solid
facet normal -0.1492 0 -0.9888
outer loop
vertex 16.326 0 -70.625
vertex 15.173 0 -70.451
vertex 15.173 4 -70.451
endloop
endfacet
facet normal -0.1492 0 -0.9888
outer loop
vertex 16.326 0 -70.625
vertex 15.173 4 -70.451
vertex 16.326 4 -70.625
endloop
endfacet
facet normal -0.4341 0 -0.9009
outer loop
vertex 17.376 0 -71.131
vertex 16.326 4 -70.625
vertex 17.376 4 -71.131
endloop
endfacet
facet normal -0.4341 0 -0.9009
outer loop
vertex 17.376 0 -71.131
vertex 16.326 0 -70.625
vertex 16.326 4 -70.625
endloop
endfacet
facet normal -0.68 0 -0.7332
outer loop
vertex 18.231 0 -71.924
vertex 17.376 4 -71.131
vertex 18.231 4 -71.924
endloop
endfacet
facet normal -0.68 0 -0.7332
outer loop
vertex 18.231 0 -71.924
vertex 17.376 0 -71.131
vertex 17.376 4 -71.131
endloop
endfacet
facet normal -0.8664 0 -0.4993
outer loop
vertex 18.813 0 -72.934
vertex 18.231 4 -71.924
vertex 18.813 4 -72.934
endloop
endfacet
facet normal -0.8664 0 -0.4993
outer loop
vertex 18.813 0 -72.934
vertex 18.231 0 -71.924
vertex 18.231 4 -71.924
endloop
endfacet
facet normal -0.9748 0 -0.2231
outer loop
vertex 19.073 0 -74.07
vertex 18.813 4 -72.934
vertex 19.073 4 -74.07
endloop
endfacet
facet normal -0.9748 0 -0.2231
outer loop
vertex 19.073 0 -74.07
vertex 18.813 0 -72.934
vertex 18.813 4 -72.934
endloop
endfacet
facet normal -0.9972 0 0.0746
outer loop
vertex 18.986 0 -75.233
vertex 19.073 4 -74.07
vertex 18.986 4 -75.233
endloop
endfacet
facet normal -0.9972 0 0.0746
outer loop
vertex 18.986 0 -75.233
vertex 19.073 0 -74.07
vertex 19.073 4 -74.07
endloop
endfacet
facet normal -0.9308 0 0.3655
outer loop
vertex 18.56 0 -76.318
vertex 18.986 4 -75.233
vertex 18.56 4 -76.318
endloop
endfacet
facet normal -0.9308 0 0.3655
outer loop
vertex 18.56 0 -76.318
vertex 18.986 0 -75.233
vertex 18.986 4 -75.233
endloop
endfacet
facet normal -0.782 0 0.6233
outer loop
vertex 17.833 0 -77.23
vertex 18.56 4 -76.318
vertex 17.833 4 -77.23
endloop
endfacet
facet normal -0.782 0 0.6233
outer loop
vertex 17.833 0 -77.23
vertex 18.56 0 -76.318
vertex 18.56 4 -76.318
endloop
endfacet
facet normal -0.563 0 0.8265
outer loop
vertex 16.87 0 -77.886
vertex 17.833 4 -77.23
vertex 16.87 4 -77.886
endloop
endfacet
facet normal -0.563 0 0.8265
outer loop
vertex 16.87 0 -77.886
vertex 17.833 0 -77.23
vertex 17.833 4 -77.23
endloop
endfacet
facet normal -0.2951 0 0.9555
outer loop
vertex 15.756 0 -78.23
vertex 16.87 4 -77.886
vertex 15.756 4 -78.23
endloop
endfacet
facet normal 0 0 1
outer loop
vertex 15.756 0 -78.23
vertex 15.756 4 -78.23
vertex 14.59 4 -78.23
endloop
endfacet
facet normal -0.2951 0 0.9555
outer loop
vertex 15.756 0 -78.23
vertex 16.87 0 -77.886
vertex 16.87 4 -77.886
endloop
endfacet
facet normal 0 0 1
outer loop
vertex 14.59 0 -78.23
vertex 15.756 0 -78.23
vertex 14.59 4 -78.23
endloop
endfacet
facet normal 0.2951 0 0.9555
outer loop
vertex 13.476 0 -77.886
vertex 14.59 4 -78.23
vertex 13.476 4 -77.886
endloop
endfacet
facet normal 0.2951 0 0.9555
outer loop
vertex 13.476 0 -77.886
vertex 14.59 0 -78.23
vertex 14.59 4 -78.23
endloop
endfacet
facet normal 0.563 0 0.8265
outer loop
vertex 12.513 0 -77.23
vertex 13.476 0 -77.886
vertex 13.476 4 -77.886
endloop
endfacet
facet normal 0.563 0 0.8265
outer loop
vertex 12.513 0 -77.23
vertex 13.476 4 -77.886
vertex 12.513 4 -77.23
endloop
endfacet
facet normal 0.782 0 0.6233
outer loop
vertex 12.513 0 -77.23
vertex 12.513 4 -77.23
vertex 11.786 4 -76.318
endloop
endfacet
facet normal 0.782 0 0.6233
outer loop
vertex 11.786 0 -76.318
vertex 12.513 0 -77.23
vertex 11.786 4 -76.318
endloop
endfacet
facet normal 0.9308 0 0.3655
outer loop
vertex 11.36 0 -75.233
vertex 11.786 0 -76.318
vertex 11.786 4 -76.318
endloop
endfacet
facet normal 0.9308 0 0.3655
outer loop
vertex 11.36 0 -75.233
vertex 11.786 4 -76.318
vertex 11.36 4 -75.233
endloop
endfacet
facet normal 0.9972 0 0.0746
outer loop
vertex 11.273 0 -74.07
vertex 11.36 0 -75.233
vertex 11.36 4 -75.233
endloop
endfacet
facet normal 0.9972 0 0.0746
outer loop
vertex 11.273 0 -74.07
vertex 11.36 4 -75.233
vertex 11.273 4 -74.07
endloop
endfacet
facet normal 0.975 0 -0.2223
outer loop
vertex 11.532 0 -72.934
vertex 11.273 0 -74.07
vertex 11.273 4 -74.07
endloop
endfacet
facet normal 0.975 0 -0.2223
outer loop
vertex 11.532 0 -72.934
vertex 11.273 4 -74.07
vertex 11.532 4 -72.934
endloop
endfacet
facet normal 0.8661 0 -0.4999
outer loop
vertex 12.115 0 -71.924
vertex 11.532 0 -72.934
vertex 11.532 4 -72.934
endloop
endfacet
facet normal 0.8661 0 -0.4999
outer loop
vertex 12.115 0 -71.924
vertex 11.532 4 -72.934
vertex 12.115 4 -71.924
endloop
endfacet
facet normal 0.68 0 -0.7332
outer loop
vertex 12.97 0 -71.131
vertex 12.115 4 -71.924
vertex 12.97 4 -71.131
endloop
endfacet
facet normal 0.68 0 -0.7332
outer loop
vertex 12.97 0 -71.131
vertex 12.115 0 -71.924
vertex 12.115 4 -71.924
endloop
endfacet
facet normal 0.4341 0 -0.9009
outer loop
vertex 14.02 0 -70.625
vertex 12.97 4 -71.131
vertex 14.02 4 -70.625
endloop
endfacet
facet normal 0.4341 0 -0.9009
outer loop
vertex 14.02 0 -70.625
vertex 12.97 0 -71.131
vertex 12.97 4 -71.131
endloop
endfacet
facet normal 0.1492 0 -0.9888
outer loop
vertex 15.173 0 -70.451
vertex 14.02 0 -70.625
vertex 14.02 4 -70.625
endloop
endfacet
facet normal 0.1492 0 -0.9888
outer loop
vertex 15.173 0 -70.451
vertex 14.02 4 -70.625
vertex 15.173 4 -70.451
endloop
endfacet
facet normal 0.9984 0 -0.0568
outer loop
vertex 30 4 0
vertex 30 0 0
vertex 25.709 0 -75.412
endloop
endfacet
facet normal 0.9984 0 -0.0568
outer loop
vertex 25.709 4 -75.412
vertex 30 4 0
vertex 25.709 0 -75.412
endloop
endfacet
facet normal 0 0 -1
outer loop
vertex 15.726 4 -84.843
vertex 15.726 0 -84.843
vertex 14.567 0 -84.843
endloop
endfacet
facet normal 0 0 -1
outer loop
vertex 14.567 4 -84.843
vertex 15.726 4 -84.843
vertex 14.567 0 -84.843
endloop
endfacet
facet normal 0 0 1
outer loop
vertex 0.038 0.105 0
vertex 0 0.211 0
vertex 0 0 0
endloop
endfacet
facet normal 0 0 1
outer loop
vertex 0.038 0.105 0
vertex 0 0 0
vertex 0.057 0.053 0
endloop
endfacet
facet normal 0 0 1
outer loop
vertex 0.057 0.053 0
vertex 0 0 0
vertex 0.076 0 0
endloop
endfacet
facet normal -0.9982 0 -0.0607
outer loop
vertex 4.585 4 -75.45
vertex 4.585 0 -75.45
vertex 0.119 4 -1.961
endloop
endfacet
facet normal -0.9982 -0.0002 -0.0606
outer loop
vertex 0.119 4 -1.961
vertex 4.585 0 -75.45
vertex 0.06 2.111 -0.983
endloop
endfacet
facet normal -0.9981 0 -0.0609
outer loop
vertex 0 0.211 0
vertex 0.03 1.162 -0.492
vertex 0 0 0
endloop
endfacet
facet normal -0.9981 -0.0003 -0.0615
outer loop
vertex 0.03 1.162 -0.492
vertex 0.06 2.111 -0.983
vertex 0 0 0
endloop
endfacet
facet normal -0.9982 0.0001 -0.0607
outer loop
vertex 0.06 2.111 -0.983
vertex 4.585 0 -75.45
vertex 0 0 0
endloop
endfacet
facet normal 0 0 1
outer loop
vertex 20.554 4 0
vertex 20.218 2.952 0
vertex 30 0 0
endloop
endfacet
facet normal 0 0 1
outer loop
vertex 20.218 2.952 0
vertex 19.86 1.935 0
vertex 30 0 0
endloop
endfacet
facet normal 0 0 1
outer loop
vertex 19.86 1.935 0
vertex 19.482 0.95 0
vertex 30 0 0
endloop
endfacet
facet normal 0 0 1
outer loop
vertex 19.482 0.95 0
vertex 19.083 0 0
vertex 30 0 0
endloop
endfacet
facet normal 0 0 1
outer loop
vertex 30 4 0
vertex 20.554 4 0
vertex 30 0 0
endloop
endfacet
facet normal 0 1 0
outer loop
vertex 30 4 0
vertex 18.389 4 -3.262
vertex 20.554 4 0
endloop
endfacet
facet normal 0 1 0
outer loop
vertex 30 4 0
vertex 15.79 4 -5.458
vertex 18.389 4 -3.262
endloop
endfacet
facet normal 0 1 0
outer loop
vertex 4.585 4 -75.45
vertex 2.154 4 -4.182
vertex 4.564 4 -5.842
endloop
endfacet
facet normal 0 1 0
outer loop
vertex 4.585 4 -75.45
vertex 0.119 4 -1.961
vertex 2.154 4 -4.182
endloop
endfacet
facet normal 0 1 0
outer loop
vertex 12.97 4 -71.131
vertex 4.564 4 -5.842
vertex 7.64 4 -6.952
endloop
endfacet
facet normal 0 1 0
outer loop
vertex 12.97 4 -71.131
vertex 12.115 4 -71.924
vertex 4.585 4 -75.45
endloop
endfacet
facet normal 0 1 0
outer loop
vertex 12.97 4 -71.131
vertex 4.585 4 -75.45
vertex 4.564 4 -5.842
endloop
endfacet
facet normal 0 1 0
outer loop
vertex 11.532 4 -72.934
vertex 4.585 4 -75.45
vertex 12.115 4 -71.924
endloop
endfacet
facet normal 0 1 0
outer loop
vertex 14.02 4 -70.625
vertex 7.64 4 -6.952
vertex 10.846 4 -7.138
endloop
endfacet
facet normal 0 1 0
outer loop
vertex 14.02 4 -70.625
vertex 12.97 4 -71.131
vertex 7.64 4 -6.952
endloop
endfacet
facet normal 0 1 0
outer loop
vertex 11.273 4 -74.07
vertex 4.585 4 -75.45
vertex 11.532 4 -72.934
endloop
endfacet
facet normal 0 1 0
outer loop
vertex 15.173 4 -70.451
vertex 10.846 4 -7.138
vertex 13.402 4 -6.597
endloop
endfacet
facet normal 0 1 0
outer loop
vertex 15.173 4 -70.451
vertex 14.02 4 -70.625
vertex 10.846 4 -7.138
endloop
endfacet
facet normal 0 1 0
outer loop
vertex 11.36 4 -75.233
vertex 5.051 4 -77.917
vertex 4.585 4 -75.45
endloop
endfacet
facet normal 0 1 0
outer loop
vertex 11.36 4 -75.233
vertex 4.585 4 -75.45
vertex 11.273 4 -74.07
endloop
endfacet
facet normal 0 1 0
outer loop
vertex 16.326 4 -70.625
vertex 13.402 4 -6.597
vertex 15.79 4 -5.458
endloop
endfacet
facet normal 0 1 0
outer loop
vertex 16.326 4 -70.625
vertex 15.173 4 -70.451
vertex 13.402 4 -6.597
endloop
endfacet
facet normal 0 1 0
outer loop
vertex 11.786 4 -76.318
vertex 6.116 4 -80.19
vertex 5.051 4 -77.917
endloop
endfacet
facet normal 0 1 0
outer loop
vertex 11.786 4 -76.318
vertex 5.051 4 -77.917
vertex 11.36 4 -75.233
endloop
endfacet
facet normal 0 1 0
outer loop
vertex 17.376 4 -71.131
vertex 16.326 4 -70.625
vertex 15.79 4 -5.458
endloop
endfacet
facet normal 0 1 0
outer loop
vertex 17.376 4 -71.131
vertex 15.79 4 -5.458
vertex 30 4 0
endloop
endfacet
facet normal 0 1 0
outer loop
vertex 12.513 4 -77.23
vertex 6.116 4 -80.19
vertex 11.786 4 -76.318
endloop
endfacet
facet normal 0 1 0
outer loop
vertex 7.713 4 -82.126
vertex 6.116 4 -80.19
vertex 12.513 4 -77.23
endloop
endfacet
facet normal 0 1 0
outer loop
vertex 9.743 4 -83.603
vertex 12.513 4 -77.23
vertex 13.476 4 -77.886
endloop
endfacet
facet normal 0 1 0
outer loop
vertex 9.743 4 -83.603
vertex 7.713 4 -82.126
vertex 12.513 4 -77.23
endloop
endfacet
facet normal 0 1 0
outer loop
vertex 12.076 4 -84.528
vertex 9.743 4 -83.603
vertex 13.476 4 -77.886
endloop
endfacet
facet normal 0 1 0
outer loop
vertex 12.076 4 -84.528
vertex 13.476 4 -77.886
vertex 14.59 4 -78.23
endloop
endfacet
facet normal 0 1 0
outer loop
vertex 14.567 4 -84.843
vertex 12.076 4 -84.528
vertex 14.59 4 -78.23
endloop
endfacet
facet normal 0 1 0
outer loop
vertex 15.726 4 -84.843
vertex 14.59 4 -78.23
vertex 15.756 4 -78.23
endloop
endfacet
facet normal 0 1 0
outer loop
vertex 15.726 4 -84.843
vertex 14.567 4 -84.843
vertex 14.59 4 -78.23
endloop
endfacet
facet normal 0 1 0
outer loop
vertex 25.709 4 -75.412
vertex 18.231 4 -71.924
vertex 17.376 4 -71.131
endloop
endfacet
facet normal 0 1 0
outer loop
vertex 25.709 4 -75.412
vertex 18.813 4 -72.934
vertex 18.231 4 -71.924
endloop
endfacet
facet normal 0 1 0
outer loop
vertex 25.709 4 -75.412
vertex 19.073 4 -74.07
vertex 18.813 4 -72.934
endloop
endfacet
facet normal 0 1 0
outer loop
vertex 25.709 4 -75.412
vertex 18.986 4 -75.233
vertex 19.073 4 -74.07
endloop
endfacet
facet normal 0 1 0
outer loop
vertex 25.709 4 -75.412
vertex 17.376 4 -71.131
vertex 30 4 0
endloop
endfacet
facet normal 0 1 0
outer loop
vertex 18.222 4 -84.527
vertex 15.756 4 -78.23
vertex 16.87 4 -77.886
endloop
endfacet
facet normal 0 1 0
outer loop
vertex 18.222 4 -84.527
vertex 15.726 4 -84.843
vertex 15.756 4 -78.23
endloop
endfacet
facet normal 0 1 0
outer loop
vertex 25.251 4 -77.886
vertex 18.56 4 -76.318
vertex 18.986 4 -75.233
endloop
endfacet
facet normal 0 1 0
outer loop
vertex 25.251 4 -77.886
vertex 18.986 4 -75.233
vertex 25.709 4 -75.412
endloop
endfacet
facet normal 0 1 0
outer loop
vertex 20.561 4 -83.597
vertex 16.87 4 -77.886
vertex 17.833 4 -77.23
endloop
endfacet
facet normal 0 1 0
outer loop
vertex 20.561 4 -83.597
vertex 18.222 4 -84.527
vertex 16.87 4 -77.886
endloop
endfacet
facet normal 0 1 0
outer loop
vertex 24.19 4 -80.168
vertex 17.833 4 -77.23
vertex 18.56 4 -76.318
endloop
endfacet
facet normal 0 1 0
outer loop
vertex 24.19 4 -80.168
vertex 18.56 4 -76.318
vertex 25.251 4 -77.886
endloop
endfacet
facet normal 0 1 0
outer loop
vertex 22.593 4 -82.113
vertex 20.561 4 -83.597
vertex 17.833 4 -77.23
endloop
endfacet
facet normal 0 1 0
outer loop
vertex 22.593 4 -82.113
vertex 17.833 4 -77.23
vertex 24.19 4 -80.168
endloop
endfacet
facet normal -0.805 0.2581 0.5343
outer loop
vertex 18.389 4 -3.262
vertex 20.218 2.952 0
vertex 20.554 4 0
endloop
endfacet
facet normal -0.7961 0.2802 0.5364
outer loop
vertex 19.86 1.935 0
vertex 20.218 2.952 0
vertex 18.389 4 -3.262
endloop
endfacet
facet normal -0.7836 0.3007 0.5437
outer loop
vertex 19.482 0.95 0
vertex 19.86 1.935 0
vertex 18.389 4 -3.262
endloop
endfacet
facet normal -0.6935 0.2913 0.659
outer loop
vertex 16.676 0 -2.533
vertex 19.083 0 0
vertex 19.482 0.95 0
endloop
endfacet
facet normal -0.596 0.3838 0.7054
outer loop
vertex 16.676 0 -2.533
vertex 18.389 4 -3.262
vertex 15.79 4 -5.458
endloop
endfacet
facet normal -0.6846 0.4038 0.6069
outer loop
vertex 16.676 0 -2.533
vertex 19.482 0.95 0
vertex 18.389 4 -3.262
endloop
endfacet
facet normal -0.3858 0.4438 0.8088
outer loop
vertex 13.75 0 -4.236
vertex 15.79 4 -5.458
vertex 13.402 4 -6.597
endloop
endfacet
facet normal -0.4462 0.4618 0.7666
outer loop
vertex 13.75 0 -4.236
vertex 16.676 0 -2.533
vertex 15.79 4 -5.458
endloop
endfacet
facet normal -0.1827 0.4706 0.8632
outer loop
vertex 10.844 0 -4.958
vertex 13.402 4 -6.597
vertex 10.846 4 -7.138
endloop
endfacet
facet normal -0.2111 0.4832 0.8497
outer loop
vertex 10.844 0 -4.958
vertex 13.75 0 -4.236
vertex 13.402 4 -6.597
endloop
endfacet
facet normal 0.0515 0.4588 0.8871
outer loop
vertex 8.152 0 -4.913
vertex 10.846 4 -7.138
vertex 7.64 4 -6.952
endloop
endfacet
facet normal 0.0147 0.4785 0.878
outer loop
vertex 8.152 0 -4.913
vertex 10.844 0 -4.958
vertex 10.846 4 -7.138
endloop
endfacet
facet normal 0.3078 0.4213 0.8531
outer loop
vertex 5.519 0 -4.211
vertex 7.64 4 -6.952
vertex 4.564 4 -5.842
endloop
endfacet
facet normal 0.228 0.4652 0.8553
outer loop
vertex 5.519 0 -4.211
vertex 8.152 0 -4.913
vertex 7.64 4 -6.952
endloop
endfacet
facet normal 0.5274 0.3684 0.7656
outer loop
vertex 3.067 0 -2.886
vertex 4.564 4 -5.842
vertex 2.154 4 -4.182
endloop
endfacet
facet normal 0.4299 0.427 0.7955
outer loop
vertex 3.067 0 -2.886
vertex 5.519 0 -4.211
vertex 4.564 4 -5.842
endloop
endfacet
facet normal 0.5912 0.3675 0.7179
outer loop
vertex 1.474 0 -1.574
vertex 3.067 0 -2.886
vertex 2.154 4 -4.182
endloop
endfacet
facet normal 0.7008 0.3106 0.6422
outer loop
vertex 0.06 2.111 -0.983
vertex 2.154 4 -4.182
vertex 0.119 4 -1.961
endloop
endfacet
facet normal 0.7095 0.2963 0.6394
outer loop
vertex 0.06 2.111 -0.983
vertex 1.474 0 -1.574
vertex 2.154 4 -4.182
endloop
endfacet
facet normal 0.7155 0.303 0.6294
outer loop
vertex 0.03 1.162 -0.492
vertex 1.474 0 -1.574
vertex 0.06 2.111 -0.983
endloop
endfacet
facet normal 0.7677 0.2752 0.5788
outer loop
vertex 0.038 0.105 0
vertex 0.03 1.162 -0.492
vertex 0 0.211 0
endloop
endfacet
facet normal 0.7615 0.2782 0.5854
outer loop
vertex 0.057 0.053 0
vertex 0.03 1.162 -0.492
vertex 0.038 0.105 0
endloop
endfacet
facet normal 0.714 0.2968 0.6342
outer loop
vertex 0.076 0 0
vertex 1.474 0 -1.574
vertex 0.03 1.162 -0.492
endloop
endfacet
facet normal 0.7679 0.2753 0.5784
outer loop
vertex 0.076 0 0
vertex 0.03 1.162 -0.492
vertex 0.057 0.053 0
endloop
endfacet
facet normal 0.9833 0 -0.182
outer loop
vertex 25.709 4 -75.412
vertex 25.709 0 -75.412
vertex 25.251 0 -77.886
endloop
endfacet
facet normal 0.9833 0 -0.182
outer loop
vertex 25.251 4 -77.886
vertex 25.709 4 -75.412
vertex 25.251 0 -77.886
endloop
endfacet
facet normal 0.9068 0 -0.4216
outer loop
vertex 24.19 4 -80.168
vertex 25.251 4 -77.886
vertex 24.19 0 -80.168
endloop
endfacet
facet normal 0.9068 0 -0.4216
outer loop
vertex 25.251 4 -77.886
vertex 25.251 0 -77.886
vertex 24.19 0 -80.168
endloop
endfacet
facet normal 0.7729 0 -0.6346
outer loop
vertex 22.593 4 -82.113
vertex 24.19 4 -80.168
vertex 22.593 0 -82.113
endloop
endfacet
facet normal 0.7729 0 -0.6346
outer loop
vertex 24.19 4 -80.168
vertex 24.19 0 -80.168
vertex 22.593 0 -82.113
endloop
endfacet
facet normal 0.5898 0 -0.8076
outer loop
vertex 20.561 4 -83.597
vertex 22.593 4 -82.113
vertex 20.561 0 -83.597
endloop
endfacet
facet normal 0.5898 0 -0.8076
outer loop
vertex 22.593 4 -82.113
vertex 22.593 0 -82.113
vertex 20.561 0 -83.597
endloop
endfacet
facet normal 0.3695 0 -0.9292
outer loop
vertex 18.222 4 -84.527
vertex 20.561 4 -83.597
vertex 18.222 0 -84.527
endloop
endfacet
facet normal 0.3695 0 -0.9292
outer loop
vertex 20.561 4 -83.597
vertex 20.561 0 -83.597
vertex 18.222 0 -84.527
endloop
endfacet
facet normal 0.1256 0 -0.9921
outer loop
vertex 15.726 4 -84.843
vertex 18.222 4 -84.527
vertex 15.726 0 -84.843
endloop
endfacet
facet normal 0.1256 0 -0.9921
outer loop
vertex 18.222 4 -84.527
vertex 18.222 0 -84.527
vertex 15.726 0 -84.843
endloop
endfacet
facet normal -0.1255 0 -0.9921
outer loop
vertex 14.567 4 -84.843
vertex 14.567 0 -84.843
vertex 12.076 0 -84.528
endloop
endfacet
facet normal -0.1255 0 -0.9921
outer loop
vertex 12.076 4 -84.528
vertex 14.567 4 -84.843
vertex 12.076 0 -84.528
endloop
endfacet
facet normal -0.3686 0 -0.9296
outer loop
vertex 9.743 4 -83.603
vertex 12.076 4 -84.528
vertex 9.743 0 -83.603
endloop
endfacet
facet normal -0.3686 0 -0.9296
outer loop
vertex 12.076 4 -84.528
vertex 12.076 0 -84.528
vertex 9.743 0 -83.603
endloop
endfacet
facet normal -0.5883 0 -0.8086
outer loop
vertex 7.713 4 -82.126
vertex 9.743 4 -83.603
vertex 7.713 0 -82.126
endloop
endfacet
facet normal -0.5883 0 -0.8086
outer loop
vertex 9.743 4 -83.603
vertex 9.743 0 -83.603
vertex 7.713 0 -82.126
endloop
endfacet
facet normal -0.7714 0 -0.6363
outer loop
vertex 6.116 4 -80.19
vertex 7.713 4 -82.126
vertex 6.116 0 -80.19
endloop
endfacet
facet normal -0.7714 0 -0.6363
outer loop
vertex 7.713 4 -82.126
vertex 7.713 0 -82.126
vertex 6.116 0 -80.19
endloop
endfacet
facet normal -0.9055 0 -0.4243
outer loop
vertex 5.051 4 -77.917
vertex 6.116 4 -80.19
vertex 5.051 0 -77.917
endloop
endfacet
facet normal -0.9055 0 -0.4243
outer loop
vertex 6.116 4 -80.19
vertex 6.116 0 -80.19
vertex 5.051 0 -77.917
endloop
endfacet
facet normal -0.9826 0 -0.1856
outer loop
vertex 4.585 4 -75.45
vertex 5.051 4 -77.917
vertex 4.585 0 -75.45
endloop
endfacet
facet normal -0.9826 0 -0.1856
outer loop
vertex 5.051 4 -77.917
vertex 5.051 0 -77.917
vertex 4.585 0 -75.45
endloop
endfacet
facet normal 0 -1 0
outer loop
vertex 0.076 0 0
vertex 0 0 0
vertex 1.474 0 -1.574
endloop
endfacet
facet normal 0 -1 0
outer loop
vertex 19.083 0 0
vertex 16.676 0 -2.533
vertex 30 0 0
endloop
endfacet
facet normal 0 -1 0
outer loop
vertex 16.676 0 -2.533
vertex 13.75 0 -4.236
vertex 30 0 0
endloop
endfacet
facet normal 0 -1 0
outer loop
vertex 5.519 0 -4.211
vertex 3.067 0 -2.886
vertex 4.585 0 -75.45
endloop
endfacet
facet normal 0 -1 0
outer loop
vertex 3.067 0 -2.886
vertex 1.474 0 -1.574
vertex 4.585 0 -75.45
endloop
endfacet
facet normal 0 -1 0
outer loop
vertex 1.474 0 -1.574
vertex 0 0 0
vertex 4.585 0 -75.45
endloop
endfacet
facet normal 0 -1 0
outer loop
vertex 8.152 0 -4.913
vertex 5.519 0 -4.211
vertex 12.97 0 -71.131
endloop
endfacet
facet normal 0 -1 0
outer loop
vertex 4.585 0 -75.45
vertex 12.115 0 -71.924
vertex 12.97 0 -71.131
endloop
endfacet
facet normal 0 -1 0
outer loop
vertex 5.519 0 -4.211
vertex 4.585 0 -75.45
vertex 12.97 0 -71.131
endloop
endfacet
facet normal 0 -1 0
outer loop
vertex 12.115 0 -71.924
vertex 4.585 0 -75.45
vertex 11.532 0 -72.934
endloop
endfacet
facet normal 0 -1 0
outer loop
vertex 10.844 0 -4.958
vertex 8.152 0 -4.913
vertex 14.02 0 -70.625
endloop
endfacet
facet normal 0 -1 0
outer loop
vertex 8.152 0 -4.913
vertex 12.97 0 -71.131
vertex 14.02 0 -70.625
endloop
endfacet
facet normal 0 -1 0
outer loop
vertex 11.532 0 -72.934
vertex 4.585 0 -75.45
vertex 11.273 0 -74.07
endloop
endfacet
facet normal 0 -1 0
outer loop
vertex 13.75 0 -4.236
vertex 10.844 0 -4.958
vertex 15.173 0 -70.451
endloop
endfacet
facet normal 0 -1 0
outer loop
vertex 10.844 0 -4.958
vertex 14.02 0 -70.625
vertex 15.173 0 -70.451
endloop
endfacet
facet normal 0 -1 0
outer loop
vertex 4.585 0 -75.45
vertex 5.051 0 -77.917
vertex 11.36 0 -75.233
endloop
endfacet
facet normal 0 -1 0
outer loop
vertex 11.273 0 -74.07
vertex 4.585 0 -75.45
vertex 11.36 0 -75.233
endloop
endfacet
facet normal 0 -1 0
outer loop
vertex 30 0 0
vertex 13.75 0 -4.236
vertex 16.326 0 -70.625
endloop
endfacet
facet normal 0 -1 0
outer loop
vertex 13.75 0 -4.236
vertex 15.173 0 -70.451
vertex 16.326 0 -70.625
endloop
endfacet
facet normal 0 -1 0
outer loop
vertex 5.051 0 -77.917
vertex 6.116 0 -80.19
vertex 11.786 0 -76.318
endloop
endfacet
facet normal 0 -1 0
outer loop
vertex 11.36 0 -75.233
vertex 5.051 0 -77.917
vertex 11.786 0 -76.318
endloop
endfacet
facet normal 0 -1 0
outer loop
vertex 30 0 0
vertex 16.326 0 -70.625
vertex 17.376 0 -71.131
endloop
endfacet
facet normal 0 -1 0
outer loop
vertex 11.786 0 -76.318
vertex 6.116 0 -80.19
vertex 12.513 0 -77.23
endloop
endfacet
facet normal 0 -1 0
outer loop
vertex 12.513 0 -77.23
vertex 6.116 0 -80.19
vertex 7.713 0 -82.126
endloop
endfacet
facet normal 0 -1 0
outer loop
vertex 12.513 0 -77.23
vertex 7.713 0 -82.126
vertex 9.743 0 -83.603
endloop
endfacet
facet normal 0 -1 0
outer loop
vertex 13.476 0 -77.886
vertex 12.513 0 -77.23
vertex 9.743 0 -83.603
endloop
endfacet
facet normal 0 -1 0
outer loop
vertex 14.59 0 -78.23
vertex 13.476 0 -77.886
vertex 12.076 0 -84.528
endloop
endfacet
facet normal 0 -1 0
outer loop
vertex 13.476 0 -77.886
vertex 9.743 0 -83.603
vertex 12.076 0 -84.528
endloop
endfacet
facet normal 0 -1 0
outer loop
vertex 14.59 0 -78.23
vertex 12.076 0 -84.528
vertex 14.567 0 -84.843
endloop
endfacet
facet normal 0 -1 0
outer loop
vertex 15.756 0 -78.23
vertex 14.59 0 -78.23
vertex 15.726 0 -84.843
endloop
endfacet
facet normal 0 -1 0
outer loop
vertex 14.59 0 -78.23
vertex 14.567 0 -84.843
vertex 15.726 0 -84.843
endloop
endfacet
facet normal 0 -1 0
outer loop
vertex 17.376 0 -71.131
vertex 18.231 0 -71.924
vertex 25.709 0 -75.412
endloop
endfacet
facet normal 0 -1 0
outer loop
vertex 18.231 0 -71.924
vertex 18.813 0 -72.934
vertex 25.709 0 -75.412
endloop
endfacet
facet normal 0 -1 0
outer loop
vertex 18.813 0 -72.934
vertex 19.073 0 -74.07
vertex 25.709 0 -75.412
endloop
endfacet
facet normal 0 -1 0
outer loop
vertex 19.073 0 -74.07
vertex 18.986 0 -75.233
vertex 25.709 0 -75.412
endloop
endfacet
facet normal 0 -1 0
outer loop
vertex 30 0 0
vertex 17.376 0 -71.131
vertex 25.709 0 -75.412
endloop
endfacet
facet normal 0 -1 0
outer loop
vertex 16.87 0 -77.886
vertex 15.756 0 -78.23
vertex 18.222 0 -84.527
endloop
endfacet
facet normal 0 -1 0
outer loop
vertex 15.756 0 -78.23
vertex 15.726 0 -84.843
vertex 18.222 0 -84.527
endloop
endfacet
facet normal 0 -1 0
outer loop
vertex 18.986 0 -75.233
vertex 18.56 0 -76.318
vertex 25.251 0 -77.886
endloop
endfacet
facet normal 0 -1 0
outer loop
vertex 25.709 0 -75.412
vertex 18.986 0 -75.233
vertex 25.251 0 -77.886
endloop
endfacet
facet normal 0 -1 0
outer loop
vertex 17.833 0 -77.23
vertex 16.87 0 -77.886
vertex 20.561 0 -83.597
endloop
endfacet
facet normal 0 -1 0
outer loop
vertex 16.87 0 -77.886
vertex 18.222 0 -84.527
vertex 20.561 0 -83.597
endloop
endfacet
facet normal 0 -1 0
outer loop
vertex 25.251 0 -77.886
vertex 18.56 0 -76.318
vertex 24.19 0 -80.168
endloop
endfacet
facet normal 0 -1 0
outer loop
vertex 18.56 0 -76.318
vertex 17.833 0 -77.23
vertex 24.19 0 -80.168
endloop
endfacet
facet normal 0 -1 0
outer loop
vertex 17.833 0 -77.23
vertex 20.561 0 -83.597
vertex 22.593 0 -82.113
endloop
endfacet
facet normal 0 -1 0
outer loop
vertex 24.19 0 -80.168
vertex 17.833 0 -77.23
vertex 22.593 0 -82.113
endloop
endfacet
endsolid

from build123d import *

# Parameters (mm, degrees)
SKETCH1_R           = 3.911052803
BOSS_EXTRUDE1_DEPTH = 4
CAVITY1_START       = 0.003221124
CAVITY1_DEPTH       = 7.362862002


# Read off the part's stored shape, not the designer's step: Cavity1
with BuildPart() as part:
    # Sketch1 → Boss-Extrude1 (new body)
    with BuildSketch(Plane(origin=(0, 0, 0), x_dir=(1, 0, 0), z_dir=(0, 1, 0))):
        with BuildLine():
            Line((0, 0), (30, 0))
            Line((30, 0), (25.709430043, 75.411524479))
            ThreePointArc((25.709430043, 75.411524479), (22.592877256, 82.112613927), (15.725576294, 84.84348898))
            Line((15.725576294, 84.84348898), (15.172794511, 84.84348898))
            Line((15.172794511, 84.84348898), (14.566572295, 84.84348898))
            ThreePointArc((14.566572295, 84.84348898), (7.713312448, 82.125853257), (4.584985356, 75.450054873))
            Line((4.584985356, 75.450054873), (0, 0))
        make_face()
        with Locations(Location((15.172794511, 74.362549593, 0), (0, 0, 270))):
            Circle(SKETCH1_R, mode=Mode.SUBTRACT)
    extrude(amount=BOSS_EXTRUDE1_DEPTH)

    # Cavity1 outline → Cavity1 (cut)
    with BuildSketch(Plane(origin=(0, 0, 0), x_dir=(0.9990997712006259, -0.037322908087554375, 0.02016550814496959), z_dir=(0.042422248724659405, 0.8790035901407052, -0.4749242479942401)).offset(CAVITY1_START)):
        with BuildLine():
            ThreePointArc((20.385742614, -1.901408695), (10.614392107, 4.37266206), (-0.069777809, -0.176158423))
            Line((-0.069777809, -0.176158423), (-2, -2.55511847))
            Line((-2, -2.55511847), (-2, -3))
            Line((-2, -3), (21.005093085, -3))
            Line((21.005093085, -3), (20.385742614, -1.901408695))
        make_face()
    extrude(amount=CAVITY1_DEPTH, mode=Mode.SUBTRACT)


solid = part.part
